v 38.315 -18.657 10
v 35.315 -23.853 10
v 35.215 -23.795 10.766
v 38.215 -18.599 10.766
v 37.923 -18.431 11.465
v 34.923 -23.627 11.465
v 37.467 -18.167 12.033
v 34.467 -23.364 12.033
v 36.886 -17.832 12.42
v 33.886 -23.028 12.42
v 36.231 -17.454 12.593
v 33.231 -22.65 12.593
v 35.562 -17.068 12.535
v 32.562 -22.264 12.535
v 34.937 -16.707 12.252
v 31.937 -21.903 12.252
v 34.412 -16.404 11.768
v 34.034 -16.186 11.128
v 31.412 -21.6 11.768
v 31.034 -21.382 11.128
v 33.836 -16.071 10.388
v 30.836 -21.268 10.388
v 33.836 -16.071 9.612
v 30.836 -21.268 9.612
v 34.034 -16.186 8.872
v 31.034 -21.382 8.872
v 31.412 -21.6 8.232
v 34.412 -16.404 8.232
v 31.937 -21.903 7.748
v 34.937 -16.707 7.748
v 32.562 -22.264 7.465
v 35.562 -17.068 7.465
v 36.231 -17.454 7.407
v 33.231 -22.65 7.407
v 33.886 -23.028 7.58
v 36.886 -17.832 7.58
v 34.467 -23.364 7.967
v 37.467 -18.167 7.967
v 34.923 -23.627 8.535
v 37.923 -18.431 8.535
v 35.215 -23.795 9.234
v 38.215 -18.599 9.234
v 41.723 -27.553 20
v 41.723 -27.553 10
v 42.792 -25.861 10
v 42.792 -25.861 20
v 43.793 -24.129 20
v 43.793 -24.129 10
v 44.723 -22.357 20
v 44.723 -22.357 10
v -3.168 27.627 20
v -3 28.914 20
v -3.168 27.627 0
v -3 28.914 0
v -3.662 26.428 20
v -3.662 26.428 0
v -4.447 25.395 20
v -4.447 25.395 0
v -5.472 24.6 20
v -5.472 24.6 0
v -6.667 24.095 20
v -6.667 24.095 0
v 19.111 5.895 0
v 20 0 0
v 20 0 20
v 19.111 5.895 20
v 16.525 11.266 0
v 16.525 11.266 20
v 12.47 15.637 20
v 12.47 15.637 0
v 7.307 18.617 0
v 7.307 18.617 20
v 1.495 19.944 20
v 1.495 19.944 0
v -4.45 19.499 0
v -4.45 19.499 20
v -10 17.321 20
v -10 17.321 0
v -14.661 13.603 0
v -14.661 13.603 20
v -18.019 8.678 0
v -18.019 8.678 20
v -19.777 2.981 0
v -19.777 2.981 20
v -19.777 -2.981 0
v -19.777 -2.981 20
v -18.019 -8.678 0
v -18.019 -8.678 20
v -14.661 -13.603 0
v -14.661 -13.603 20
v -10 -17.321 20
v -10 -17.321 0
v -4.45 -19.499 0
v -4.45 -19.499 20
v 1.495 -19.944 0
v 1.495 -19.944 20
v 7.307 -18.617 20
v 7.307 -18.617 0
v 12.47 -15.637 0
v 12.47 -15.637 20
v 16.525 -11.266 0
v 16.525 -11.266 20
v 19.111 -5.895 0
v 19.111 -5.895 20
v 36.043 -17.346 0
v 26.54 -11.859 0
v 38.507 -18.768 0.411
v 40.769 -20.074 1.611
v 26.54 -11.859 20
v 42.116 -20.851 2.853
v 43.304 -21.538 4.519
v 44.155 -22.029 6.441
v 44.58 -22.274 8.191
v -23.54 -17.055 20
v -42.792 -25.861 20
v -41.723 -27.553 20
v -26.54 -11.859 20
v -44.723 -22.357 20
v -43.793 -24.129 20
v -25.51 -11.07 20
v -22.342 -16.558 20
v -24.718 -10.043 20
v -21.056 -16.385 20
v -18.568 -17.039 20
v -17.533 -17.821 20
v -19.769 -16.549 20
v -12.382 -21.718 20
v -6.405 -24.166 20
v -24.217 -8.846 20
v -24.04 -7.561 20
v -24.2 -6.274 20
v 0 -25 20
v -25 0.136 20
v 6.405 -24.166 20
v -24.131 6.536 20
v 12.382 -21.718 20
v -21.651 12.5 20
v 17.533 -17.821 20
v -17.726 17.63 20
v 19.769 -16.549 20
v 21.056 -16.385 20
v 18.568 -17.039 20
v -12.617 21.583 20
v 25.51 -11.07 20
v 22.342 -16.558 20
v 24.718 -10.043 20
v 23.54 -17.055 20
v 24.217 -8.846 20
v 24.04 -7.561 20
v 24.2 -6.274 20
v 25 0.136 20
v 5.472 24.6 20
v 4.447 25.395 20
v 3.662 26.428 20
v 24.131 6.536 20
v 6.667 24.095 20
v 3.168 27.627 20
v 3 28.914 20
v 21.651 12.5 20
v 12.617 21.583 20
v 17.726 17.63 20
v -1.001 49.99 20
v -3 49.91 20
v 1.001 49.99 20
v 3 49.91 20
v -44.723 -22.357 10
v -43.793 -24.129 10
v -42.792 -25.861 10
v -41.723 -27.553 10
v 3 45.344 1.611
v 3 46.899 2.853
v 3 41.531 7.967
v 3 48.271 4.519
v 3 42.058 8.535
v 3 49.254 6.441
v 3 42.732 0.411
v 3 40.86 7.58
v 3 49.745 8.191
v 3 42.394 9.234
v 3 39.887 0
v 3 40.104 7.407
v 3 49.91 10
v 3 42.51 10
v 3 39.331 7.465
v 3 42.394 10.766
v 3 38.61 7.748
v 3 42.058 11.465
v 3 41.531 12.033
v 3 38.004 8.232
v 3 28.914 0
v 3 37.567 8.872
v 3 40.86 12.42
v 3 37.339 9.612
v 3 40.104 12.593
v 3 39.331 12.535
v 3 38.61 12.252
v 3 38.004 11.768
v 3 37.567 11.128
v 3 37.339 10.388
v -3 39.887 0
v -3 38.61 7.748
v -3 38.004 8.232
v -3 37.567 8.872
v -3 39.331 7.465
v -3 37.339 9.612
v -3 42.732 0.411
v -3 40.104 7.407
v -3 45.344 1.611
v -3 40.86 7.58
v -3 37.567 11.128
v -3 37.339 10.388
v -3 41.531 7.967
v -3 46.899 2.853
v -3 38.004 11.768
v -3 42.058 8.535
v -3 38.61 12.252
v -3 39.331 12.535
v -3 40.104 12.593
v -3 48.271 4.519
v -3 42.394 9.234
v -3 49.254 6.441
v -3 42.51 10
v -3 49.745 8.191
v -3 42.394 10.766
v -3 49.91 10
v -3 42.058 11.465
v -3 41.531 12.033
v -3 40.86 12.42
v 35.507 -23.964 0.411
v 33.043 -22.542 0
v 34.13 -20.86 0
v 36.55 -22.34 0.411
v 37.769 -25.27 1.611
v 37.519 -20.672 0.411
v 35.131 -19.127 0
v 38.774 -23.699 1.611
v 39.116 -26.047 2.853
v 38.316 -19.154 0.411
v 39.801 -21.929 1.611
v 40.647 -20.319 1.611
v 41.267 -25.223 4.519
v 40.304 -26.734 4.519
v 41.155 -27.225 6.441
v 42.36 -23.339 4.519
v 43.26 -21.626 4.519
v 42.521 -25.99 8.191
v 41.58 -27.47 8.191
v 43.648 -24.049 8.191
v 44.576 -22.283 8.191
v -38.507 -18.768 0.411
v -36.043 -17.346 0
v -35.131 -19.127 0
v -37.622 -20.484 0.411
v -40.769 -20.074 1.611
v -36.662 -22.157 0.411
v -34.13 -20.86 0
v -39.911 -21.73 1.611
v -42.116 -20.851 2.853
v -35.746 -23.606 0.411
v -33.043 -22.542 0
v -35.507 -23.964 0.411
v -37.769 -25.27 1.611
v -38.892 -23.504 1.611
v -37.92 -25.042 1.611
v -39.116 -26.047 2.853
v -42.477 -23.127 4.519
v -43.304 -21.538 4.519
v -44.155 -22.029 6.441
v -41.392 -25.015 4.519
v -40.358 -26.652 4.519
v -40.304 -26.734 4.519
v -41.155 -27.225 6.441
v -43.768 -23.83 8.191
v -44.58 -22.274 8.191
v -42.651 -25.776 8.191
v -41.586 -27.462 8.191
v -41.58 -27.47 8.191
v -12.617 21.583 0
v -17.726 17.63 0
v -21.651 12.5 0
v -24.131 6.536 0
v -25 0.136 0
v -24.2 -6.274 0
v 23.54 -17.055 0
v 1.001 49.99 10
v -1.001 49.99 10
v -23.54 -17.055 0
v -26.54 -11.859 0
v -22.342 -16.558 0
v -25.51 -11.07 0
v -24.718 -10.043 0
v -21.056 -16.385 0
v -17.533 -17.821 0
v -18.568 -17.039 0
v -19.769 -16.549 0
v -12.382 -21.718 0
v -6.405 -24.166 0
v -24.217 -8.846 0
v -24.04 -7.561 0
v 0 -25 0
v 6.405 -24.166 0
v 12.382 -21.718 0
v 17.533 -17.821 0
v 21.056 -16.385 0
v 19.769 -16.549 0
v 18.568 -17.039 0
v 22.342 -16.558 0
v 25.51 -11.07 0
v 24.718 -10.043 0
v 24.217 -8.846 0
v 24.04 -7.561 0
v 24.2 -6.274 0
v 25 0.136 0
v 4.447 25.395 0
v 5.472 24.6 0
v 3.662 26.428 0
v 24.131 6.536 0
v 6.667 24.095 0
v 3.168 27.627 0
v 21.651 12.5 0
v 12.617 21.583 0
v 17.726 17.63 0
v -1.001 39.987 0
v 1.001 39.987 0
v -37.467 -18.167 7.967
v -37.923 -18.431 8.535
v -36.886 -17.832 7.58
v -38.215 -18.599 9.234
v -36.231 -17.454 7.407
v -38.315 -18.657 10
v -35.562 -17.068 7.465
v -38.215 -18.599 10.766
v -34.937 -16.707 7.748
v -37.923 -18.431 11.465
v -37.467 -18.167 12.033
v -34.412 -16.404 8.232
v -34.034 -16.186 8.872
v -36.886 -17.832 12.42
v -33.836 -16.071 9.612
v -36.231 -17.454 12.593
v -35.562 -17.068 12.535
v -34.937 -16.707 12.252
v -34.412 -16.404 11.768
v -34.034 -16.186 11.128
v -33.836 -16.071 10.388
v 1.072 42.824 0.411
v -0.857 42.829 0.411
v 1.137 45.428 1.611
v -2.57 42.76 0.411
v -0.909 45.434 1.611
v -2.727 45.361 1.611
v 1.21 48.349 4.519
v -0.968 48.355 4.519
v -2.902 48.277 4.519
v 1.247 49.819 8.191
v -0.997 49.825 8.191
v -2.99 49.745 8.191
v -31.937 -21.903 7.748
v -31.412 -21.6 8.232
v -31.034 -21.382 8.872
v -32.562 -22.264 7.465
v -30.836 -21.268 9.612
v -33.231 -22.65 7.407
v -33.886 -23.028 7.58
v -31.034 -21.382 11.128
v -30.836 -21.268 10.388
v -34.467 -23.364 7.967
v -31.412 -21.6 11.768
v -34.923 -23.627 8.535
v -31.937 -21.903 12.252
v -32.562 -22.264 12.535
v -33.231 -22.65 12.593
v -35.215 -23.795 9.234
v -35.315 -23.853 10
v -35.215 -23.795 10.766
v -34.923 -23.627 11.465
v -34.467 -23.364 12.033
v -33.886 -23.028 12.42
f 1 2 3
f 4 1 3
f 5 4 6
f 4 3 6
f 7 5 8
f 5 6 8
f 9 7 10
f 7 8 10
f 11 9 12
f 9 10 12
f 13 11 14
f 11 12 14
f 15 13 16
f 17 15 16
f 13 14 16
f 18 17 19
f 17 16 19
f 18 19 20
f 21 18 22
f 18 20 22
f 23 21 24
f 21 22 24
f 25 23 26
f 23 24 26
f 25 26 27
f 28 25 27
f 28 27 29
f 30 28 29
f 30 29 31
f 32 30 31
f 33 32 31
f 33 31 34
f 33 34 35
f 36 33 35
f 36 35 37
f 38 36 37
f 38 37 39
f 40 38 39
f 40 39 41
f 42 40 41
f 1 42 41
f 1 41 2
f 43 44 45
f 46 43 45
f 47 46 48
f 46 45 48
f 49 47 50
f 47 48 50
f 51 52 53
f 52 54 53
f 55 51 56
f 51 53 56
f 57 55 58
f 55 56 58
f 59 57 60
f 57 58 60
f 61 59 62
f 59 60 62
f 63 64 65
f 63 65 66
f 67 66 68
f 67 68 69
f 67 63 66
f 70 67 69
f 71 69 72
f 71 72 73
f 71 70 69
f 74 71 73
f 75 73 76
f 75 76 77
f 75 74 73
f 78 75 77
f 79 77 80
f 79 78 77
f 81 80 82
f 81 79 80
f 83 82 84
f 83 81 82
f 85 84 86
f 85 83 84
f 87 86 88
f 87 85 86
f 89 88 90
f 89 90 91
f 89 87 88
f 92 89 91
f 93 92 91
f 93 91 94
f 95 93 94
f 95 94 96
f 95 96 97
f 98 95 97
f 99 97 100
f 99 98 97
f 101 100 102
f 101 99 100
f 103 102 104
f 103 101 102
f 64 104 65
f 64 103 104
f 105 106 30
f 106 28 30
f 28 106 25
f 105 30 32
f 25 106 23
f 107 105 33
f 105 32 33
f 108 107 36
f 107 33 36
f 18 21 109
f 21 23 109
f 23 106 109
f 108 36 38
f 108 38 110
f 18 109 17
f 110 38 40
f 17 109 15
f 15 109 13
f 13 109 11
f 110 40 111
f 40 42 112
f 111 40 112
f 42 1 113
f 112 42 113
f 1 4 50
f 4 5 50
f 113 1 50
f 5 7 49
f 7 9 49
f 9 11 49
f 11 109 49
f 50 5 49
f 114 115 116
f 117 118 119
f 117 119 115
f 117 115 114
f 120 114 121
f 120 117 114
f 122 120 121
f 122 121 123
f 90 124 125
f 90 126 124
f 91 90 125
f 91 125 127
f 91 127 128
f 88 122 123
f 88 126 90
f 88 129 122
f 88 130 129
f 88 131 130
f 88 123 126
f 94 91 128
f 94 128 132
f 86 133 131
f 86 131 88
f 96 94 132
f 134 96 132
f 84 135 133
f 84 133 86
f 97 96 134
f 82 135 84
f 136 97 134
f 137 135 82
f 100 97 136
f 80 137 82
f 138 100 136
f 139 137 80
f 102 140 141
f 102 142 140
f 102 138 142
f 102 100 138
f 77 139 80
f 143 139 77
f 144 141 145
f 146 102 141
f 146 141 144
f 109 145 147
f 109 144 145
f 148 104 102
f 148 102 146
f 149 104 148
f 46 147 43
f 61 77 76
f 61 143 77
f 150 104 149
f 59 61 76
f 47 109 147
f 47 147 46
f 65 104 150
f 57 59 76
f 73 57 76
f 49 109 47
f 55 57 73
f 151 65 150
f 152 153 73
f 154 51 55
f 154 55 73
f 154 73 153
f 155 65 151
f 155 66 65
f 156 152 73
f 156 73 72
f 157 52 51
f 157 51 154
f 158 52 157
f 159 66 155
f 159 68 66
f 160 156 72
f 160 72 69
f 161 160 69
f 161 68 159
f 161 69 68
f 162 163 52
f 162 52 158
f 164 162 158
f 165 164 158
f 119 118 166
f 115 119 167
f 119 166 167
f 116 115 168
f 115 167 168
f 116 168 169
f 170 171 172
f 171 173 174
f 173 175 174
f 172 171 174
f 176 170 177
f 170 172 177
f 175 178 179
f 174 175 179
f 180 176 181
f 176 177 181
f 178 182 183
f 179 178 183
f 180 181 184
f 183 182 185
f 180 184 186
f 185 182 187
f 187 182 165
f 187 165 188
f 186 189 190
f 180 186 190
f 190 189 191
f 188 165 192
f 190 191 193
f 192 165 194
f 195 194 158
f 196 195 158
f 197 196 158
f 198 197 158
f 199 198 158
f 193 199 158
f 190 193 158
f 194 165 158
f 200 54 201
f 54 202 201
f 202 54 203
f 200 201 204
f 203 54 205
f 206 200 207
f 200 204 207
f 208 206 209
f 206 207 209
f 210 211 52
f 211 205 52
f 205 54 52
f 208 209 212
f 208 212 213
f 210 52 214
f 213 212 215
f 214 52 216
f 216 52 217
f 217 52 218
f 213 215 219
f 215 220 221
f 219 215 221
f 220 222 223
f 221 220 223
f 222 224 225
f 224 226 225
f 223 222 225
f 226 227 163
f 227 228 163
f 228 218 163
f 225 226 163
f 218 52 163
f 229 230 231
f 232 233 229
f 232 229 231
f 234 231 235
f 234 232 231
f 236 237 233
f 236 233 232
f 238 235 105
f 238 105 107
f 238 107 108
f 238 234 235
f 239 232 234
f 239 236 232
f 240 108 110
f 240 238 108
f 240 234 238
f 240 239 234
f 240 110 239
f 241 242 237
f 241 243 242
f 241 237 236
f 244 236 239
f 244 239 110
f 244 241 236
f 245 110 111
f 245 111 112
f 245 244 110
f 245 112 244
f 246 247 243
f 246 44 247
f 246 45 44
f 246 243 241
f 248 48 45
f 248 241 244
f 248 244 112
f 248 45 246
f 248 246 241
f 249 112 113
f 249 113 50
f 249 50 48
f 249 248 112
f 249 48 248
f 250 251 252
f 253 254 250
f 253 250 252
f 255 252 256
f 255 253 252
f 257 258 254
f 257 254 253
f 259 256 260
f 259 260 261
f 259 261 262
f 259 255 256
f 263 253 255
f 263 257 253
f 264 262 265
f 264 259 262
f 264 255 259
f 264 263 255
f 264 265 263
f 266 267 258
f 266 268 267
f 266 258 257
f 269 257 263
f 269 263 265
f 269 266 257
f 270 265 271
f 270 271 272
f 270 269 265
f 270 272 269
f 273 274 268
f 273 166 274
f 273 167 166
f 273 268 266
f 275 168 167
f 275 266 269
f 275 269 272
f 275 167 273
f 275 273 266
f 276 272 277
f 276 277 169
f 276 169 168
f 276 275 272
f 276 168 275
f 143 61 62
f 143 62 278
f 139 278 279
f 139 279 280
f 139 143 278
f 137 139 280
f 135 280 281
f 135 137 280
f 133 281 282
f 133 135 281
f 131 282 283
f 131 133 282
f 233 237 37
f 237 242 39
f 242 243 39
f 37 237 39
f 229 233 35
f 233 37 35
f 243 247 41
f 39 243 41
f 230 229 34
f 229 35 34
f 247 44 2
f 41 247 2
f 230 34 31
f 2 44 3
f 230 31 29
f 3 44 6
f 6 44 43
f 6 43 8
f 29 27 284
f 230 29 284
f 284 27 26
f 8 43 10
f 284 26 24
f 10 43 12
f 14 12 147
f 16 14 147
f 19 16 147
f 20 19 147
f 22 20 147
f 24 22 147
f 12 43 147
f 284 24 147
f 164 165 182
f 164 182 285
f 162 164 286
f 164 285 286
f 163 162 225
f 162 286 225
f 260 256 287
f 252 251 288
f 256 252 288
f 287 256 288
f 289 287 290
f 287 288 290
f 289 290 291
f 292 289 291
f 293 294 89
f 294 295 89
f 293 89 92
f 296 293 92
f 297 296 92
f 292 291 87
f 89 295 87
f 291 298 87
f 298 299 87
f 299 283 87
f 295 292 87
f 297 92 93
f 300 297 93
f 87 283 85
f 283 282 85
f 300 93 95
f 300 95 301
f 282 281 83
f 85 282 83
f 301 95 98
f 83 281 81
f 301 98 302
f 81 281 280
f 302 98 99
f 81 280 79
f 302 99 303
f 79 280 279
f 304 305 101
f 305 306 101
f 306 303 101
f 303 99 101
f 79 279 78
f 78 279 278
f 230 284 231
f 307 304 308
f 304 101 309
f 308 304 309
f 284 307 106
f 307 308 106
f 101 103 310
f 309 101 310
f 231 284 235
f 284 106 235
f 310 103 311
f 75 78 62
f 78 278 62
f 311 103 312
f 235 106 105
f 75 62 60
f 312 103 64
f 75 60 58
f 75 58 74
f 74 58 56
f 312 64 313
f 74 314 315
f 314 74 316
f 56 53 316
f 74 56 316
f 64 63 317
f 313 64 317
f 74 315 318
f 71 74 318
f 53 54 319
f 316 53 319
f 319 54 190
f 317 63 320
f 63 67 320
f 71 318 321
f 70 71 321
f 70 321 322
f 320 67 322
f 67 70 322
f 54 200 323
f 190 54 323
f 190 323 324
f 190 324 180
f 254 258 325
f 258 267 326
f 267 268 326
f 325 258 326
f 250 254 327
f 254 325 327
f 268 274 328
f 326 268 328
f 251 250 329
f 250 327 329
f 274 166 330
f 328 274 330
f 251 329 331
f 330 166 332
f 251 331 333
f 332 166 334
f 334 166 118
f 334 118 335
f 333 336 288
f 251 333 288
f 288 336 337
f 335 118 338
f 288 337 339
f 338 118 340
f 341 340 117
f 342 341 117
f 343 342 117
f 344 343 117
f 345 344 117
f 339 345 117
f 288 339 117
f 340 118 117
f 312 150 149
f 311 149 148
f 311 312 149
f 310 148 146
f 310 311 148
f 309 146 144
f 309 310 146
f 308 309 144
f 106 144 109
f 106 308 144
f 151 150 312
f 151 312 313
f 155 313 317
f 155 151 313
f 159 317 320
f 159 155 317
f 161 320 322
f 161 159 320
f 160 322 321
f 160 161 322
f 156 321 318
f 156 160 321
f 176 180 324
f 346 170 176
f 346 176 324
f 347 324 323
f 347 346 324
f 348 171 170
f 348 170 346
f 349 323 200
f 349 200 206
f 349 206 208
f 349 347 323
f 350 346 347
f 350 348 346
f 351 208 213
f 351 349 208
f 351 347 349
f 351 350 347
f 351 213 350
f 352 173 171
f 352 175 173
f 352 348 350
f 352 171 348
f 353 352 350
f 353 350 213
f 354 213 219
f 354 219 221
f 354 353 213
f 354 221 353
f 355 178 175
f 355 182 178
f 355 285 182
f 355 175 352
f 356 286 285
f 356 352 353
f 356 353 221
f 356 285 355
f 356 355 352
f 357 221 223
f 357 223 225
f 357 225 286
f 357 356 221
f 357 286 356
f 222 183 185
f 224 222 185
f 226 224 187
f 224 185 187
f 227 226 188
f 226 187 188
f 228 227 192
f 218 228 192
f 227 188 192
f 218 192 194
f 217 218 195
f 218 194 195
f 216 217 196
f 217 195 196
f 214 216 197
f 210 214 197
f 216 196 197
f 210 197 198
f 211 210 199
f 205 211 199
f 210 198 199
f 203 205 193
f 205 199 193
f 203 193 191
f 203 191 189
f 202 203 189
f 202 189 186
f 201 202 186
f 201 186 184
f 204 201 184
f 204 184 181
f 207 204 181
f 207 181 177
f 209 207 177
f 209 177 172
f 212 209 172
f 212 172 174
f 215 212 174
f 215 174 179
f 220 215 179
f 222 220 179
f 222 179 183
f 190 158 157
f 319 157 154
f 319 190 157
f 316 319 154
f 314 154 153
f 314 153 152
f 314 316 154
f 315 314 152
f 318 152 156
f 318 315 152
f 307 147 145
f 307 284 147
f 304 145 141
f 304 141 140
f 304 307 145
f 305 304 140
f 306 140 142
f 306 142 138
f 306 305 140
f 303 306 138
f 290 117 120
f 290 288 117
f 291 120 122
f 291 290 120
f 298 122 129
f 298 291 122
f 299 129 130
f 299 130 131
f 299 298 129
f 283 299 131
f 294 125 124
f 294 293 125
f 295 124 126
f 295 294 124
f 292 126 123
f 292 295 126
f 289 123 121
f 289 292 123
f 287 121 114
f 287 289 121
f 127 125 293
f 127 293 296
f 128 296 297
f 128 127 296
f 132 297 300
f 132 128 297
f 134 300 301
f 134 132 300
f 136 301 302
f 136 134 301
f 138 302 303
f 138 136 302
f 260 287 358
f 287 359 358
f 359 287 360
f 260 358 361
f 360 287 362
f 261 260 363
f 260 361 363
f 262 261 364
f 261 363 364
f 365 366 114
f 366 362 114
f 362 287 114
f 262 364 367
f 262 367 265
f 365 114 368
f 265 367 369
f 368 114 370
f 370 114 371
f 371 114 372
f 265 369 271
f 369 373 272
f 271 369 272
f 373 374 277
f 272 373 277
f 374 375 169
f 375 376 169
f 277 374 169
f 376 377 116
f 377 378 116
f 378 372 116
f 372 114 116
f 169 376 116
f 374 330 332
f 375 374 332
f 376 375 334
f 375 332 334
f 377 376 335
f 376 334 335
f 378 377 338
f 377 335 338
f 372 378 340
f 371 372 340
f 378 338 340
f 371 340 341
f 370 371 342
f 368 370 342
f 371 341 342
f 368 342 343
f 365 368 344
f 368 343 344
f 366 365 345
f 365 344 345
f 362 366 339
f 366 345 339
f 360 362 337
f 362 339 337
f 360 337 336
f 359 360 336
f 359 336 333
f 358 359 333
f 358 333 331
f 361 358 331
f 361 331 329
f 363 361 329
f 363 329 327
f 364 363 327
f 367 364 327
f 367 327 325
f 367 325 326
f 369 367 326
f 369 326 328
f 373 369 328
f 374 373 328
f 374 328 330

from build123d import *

# Parameters (mm, degrees)
SKETCH_R              = 50
SKETCH_R_2            = 20
PAD_DEPTH             = 20
POCKET_DEPTH          = 305.658137
POLARPATTERN_COUNT    = 3
SKETCH003_R           = 2.6
POCKET002_DEPTH       = 287.850495
POLARPATTERN001_COUNT = 3
FILLET_R              = 5
FILLET001_R           = 10


with BuildPart() as part:
    # Sketch → Pad (new body)
    with BuildSketch(Plane.XY):
        Circle(SKETCH_R)
        Circle(SKETCH_R_2, mode=Mode.SUBTRACT)
    extrude(amount=PAD_DEPTH)

    # Sketch001 (on Face4 of Pad) → Pocket (cut, through all)
    with BuildSketch(Plane.XY.offset(20)):
        with BuildLine():
            ThreePointArc((22.994185, -9.811597), (21.650635, 12.5), (3, 24.819347))
            Line((3, 55.952225), (3, 24.819347))
            ThreePointArc((49.956048, -25.378036), (48.525649, 28.016297), (3, 55.952225))
            Line((22.994185, -9.811597), (49.956048, -25.378036))
        make_face()
    pocket = extrude(amount=-POCKET_DEPTH, mode=Mode.SUBTRACT)

    # PolarPattern: Pocket ×3 about axis
    polarpattern_axis = Axis((0, 0, 20), (0, 0, 1))
    for i in range(1, POLARPATTERN_COUNT):
        add(pocket.rotate(polarpattern_axis, i * 360 / POLARPATTERN_COUNT), mode=Mode.SUBTRACT)

    # Sketch003 → Pocket002 (cut, through all)
    with BuildSketch(Plane.YZ.offset(3)):
        with Locations((39.909919, 10)):
            Circle(SKETCH003_R)
    pocket002 = extrude(amount=-POCKET002_DEPTH, mode=Mode.SUBTRACT)

    # PolarPattern001: Pocket002 ×3 about axis
    polarpattern001_axis = Axis((0, 0, 0), (0, 0, 1))
    for i in range(1, POLARPATTERN001_COUNT):
        add(pocket002.rotate(polarpattern001_axis, i * 360 / POLARPATTERN001_COUNT), mode=Mode.SUBTRACT)

    # Fillet
    fillet_edges = [part.edges().sort_by_distance(p)[0] for p in [
        (-22.994185, -9.811597, 10),
        (-19.994185, -15.00775, 10),
        (19.994185, -15.00775, 10),
        (22.994185, -9.811597, 10),
        (3, 24.819347, 10),
        (-3, 24.819347, 10),
    ]]
    fillet(fillet_edges, radius=FILLET_R)

    # Fillet001
    fillet001_edges = [part.edges().sort_by_distance(p)[0] for p in [
        (0, 50, 0),
        (-43.30127, -25, 0),
        (43.30127, -25, 0),
    ]]
    fillet(fillet001_edges, radius=FILLET001_R)


solid = part.part
